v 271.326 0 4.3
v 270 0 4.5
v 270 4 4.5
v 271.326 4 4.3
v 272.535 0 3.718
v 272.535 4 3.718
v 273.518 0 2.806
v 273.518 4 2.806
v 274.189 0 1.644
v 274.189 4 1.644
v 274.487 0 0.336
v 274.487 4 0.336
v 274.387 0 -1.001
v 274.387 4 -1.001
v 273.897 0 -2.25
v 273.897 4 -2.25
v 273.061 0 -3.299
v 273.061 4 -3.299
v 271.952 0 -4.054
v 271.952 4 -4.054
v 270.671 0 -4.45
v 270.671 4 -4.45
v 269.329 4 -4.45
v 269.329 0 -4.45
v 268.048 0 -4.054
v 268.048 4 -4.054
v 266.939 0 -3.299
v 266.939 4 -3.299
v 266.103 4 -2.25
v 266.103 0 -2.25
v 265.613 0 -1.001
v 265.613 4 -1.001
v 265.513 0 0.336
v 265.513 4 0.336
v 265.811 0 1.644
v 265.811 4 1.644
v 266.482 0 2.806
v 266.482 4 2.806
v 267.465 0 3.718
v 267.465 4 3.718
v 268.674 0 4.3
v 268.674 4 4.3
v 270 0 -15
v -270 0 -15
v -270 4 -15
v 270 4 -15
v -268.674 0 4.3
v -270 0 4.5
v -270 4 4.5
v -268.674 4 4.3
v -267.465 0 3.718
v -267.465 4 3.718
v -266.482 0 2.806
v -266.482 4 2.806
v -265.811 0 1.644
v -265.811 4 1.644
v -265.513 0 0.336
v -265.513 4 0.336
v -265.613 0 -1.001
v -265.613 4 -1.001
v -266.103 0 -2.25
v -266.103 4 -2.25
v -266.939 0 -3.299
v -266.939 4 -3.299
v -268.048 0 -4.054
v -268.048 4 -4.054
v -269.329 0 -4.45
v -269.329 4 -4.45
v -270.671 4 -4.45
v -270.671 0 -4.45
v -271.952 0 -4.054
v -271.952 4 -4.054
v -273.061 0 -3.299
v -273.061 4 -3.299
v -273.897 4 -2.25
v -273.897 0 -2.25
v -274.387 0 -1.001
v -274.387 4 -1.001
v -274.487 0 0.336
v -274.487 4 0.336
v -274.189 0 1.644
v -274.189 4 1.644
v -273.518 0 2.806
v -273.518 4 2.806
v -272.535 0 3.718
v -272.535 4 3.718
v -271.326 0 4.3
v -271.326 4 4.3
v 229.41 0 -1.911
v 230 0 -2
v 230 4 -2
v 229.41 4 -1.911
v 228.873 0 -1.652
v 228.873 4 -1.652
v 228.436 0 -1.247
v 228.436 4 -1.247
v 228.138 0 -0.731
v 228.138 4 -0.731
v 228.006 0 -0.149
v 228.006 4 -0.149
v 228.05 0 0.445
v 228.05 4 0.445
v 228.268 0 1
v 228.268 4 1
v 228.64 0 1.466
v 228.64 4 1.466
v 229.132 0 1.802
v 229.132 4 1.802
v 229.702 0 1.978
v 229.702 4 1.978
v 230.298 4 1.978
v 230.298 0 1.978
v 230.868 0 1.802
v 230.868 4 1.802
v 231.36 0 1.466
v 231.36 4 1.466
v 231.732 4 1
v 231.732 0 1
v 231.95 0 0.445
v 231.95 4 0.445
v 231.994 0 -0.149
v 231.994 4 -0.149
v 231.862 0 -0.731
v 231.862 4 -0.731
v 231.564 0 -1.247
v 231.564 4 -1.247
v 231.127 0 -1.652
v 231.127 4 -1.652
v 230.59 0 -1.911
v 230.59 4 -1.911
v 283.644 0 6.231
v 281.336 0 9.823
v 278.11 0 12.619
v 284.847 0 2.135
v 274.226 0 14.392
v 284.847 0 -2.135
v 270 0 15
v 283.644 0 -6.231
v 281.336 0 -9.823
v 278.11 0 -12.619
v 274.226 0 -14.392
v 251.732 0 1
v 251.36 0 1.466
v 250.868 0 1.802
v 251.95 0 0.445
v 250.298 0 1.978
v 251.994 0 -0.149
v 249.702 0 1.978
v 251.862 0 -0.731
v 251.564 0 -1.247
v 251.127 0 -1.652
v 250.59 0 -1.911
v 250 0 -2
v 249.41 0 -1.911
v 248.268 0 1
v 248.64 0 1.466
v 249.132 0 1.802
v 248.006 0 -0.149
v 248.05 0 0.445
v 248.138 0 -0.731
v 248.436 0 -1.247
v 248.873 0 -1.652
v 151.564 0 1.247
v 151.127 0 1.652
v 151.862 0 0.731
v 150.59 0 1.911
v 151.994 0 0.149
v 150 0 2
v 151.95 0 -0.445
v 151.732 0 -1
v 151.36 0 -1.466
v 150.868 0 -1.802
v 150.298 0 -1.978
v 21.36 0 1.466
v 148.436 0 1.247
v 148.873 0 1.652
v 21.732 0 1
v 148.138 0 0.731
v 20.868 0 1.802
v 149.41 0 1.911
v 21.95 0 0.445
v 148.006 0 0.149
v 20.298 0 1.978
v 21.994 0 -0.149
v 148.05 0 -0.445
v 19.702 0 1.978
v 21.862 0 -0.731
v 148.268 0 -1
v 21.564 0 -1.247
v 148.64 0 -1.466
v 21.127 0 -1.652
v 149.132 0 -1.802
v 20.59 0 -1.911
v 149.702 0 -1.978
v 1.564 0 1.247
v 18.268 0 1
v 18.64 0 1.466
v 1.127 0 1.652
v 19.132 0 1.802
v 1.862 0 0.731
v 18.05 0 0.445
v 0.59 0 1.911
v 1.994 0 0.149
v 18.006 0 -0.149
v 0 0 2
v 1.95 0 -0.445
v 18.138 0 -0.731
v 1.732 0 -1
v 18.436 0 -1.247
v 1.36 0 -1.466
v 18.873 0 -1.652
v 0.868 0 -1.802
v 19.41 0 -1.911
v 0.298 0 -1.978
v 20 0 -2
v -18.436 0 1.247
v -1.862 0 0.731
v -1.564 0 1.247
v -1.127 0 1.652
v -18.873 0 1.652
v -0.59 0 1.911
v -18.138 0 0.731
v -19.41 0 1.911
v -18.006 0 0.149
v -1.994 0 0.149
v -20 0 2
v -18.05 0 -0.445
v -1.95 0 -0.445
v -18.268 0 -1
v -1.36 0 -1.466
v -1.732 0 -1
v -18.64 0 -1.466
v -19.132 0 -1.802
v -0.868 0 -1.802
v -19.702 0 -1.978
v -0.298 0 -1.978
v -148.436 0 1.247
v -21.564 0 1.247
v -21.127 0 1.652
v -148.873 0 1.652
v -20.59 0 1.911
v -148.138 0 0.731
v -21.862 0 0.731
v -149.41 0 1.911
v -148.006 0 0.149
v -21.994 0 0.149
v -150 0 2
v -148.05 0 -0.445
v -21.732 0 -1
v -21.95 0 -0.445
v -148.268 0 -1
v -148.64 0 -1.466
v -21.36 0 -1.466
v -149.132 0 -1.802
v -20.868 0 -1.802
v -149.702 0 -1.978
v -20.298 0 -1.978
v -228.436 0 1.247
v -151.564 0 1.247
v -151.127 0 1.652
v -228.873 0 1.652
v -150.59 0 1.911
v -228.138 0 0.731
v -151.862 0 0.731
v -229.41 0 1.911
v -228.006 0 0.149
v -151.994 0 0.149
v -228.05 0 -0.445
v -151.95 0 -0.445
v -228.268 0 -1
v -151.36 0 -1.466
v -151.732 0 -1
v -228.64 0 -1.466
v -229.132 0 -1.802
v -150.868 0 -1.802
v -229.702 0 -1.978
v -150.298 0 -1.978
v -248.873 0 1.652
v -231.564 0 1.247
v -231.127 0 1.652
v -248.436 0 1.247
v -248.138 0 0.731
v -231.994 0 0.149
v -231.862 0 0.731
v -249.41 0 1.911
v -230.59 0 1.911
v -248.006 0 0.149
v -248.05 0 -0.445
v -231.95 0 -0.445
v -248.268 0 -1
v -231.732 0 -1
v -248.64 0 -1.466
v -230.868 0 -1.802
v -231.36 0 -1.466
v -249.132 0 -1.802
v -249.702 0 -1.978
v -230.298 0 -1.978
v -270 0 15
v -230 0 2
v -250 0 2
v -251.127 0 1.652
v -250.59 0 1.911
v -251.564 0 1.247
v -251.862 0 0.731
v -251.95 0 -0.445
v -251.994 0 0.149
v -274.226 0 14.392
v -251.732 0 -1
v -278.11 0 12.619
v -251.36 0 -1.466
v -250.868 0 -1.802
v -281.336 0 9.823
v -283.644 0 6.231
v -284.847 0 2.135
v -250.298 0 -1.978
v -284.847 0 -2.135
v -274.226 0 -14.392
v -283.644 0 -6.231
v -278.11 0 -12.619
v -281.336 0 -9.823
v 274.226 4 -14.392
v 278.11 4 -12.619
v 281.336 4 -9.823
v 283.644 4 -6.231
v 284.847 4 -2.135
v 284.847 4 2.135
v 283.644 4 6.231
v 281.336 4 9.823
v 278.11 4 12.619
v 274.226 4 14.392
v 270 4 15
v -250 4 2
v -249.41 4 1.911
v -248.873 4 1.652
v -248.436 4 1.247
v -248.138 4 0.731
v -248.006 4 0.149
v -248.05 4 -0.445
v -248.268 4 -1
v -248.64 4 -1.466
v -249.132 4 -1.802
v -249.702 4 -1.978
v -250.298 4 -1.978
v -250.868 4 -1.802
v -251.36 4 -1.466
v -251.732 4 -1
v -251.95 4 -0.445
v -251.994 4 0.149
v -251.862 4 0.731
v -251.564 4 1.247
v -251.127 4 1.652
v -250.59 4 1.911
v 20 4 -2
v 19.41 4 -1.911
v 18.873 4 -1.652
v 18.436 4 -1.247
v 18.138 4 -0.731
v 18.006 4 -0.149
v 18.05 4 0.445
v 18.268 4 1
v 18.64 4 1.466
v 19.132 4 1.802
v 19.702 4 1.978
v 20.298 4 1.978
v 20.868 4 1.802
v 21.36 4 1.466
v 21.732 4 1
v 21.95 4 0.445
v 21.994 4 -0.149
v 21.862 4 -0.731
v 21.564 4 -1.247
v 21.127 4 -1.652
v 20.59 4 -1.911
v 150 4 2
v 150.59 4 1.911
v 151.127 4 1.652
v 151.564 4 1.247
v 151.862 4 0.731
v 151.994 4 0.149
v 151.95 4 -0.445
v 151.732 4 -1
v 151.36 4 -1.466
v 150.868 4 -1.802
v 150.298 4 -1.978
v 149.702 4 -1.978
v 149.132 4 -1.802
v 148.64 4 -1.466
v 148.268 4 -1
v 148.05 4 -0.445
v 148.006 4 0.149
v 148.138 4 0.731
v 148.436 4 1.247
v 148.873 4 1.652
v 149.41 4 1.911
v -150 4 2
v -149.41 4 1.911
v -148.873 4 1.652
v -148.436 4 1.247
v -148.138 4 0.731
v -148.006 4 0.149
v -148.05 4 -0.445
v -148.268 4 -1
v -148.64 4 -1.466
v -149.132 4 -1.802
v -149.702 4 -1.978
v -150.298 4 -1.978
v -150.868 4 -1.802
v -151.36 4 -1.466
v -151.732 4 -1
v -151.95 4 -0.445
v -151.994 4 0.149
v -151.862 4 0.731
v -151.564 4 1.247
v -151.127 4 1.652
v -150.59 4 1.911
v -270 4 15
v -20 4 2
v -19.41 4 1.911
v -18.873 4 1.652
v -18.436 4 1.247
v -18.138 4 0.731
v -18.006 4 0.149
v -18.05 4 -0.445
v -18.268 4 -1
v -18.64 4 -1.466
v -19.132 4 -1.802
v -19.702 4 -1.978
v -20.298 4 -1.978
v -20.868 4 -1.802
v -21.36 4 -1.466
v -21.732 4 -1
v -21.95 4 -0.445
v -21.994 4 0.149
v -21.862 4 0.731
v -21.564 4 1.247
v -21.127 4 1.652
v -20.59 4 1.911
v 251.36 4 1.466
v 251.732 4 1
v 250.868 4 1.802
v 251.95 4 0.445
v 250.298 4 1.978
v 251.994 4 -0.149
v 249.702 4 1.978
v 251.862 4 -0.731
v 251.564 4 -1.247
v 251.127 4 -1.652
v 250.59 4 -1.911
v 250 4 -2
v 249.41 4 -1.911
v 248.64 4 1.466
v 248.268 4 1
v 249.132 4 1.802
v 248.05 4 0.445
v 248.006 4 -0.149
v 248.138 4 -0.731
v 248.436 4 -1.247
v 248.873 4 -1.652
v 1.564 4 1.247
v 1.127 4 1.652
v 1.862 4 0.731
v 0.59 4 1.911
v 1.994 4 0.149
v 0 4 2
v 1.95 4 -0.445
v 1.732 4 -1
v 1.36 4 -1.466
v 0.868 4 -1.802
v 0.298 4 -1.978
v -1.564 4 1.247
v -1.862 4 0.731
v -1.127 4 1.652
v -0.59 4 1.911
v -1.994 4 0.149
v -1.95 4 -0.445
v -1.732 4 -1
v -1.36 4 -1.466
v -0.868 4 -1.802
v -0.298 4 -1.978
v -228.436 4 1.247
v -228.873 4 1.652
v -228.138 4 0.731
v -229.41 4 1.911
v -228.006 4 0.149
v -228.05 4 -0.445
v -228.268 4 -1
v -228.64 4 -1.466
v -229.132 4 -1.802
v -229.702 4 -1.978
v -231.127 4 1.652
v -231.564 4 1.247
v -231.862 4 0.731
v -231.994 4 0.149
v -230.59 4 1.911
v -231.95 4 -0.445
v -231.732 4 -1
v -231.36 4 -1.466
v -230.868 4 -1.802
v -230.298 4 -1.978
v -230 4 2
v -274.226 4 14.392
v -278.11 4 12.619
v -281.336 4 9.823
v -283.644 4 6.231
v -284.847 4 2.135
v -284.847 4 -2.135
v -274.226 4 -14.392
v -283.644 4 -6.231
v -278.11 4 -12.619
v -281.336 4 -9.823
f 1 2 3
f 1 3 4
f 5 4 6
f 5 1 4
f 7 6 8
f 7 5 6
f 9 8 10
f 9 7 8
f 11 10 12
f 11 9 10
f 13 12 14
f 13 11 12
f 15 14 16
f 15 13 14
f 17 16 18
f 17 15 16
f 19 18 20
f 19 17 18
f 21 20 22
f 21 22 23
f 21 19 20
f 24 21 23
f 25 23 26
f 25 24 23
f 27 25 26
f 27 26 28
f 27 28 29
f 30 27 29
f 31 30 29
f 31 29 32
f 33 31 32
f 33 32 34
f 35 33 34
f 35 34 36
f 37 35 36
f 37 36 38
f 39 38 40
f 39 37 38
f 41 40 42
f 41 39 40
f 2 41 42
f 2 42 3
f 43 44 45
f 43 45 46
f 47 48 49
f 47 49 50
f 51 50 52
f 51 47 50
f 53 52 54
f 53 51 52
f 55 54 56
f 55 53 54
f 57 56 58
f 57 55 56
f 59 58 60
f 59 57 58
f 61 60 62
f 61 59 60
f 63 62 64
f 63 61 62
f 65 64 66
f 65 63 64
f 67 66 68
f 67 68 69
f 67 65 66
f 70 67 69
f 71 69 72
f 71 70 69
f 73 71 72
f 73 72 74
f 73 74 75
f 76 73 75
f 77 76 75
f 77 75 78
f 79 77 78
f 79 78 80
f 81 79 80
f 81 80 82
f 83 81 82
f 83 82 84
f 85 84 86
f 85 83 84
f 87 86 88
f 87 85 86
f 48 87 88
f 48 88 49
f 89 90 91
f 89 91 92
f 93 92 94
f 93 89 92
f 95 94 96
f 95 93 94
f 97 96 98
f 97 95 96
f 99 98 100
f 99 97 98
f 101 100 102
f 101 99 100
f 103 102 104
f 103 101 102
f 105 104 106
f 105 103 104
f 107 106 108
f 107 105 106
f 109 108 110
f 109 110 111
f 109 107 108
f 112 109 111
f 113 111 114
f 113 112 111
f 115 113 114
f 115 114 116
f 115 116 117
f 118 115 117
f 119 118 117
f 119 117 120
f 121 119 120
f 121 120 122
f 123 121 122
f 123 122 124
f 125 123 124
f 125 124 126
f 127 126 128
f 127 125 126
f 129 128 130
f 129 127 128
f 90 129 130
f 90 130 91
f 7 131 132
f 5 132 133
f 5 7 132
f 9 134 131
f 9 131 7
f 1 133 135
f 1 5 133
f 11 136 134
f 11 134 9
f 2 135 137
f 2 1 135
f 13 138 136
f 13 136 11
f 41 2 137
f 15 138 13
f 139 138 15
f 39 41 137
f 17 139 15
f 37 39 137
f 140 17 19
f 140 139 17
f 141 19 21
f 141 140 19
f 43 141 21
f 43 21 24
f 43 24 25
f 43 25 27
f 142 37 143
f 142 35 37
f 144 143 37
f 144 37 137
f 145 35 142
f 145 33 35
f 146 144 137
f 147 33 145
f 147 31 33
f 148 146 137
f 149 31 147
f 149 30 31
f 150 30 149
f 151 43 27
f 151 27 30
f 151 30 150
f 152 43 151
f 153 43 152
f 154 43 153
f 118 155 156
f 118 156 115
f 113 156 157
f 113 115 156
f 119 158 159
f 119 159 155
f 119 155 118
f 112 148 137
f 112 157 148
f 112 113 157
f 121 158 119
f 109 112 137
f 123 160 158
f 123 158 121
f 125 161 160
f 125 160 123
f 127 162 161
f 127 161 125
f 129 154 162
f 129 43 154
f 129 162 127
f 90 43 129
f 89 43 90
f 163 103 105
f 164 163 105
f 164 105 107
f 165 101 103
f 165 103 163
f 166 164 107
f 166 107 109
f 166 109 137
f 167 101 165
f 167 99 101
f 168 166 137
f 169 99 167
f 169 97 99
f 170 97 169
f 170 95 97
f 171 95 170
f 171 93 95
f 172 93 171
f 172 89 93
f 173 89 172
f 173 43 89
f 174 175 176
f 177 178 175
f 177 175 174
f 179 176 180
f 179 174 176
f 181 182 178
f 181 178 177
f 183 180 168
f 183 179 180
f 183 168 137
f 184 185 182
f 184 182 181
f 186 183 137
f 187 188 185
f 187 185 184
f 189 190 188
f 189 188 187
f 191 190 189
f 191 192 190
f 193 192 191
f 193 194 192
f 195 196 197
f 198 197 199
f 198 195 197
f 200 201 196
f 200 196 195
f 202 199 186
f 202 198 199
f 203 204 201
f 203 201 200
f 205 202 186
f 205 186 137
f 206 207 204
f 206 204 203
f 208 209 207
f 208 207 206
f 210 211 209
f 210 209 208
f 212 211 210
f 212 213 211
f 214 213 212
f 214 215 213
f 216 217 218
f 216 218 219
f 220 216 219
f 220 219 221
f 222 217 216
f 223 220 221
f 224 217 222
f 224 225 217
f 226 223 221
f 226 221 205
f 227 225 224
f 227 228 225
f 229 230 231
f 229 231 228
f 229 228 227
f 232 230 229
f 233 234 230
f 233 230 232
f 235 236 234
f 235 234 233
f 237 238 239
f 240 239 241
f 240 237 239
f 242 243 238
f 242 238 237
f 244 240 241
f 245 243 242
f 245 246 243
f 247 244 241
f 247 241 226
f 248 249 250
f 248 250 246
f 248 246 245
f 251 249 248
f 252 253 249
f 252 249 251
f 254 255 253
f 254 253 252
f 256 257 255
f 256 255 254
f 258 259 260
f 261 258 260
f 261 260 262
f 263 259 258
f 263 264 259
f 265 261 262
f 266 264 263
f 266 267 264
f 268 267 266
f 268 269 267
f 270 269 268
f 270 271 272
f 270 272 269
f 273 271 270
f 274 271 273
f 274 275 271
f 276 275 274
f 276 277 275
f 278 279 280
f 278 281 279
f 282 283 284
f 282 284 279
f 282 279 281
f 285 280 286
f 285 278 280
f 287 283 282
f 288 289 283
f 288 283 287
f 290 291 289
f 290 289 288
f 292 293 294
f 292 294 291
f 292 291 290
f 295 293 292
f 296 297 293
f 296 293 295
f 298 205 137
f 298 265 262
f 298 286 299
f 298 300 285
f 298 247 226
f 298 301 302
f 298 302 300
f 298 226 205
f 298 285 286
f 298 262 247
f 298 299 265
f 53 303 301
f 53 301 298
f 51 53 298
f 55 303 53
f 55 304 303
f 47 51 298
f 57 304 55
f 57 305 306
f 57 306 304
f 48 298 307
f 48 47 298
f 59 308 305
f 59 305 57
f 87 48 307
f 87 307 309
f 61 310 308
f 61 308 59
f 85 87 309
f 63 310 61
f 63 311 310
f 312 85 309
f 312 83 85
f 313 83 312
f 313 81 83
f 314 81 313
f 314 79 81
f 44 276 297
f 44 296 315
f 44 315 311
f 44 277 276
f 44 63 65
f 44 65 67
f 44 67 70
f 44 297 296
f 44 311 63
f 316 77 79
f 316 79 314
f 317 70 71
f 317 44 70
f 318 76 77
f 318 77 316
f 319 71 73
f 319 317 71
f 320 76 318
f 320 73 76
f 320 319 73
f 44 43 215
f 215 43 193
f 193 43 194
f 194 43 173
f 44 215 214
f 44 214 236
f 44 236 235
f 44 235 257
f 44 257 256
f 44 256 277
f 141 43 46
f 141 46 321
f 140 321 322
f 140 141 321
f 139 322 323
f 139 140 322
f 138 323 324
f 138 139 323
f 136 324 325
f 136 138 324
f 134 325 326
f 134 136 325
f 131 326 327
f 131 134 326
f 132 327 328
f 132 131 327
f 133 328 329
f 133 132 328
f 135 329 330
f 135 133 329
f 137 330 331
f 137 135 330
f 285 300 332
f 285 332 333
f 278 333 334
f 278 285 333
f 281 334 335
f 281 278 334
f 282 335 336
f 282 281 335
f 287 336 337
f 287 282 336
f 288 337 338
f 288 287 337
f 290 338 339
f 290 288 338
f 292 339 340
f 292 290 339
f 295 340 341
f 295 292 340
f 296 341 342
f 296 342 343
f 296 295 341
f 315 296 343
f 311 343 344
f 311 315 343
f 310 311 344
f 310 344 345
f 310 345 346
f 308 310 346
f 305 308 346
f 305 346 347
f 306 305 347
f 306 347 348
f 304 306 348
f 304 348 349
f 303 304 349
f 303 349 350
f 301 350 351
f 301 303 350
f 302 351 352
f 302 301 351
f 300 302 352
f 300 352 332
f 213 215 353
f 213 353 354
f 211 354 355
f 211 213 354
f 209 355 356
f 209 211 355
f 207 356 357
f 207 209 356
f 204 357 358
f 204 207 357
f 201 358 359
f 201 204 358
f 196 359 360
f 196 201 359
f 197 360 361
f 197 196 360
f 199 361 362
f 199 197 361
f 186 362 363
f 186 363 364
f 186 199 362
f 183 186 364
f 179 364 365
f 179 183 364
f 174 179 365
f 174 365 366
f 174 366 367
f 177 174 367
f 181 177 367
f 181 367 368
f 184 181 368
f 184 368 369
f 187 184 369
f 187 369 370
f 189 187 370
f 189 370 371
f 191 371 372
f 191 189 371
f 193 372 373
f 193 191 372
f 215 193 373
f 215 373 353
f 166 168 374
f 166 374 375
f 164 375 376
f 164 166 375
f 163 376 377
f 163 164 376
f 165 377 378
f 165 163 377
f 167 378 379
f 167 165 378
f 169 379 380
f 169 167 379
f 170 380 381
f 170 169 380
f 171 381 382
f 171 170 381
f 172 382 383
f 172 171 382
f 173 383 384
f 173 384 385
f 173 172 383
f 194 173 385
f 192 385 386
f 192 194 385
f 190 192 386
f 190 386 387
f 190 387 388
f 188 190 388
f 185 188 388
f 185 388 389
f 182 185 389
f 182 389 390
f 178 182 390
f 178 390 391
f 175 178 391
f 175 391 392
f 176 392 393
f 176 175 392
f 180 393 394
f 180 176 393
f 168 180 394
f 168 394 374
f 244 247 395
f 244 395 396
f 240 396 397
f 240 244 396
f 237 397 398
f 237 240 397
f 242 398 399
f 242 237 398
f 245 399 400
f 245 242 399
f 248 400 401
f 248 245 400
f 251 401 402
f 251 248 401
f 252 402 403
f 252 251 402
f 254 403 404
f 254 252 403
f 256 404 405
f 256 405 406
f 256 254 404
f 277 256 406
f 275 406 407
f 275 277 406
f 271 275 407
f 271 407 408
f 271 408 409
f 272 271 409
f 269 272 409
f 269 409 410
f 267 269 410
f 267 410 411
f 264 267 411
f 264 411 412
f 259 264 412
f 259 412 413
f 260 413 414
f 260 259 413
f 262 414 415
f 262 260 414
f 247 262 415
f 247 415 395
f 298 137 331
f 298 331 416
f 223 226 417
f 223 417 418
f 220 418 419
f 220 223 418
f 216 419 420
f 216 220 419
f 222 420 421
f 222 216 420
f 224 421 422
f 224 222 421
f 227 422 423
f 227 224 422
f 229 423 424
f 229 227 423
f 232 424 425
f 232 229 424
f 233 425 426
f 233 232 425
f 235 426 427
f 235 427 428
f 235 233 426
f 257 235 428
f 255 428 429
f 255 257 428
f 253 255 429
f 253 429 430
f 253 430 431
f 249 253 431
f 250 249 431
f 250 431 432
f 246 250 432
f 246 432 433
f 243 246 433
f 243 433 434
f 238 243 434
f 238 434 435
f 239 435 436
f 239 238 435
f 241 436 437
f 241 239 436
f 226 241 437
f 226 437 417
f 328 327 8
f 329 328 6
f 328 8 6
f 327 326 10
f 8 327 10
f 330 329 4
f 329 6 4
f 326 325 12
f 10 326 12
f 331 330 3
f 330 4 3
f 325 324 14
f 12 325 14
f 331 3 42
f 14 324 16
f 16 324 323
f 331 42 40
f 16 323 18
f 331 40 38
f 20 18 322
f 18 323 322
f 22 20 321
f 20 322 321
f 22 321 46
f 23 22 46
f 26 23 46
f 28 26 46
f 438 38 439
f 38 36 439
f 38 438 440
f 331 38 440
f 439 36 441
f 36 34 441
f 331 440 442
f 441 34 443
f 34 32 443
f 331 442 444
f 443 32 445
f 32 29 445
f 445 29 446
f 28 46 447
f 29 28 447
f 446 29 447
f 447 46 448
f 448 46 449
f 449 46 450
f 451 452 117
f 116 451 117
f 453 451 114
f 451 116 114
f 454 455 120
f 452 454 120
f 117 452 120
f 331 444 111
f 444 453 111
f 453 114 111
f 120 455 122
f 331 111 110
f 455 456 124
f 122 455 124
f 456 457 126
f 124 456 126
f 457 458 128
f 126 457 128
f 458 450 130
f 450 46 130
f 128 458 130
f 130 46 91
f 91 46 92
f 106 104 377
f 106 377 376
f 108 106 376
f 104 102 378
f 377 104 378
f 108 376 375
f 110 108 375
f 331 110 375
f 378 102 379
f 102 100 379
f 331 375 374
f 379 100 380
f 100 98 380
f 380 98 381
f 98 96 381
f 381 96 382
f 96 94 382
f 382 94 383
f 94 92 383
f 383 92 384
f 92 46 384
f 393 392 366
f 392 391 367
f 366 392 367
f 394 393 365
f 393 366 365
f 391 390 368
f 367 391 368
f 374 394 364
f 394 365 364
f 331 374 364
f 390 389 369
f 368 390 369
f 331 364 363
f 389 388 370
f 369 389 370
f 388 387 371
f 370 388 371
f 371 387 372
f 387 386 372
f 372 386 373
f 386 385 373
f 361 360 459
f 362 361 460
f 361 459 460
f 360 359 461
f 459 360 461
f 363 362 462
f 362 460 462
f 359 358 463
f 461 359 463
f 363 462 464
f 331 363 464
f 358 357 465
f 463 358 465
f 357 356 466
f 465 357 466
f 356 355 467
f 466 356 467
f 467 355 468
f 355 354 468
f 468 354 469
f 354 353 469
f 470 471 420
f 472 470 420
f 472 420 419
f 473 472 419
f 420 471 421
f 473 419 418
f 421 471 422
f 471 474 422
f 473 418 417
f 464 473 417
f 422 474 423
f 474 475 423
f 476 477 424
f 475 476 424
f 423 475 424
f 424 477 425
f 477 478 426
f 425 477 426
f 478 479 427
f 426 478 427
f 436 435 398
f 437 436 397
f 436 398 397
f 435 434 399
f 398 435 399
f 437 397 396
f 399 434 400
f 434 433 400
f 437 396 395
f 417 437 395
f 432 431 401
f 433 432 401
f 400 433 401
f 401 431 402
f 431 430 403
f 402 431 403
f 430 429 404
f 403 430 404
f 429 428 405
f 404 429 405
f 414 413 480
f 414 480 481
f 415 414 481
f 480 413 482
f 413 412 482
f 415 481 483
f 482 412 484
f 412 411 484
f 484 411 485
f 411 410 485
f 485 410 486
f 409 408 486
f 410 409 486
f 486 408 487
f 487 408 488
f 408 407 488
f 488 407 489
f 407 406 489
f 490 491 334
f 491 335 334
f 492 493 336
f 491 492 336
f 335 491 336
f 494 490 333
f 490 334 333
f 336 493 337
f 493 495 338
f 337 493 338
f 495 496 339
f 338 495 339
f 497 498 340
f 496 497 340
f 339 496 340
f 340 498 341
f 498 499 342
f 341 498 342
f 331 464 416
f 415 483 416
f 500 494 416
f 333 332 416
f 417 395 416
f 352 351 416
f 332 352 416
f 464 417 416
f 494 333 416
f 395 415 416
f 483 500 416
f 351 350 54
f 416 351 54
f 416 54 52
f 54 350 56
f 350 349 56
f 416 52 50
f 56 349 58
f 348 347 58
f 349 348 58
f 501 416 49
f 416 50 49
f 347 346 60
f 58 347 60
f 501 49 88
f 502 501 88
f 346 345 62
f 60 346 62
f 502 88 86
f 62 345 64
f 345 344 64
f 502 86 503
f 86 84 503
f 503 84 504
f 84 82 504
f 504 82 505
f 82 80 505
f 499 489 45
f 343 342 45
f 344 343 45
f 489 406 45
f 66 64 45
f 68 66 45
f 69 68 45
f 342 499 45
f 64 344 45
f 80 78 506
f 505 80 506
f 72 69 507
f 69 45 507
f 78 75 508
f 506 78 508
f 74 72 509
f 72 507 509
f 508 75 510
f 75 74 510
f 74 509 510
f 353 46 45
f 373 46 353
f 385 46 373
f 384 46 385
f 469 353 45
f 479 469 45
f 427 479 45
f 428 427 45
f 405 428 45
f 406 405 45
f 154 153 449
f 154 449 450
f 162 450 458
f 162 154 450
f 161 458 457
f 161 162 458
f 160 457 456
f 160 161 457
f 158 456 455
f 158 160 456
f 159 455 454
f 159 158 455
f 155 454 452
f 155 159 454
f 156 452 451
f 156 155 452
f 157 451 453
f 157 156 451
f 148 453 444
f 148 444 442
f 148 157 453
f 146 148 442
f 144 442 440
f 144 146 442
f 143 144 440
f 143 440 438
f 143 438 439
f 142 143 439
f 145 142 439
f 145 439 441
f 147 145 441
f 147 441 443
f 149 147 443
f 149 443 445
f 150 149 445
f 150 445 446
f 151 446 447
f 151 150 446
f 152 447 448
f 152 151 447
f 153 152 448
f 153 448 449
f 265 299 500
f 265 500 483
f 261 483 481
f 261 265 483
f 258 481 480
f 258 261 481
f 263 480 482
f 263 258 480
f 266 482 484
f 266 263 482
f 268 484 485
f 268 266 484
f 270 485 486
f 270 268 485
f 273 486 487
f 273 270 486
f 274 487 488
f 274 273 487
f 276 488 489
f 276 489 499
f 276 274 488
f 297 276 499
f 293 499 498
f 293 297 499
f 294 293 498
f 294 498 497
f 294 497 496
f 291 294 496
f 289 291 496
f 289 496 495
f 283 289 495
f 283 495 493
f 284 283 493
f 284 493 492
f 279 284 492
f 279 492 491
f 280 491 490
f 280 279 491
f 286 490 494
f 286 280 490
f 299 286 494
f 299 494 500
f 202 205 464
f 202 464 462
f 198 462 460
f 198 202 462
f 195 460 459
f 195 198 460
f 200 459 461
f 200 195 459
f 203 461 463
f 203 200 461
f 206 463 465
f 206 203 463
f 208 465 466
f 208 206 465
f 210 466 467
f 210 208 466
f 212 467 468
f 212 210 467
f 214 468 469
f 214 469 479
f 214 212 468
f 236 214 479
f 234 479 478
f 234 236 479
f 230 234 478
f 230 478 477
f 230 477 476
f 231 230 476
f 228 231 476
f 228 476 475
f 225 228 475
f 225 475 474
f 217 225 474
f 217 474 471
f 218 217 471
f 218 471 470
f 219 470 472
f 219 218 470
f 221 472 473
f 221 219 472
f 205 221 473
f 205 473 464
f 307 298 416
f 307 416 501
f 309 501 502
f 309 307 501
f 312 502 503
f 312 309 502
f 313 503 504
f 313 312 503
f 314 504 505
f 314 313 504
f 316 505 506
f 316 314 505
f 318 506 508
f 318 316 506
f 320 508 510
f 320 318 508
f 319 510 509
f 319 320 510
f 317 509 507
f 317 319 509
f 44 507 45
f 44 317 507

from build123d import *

# Parameters (mm, degrees)
SKETCH1_R           = 4.5
SKETCH1_R_2         = 2
BOSS_EXTRUDE1_DEPTH = 4


with BuildPart() as part:
    # Sketch1 → Boss-Extrude1 (new body)
    with BuildSketch(Plane(origin=(0, 0, 0), x_dir=(1, 0, 0), z_dir=(0, 1, 0))):
        with BuildLine():
            Line((-270, 15), (270, 15))
            ThreePointArc((270, 15), (285, 0), (270, -15))
            Line((270, -15), (-270, -15))
            ThreePointArc((-270, -15), (-285, 0), (-270, 15))
        make_face()
        with Locations(Location((-270, 0, 0), (0, 0, 270))):
            Circle(SKETCH1_R, mode=Mode.SUBTRACT)
        with Locations(Location((270, 0, 0), (0, 0, 270))):
            Circle(SKETCH1_R, mode=Mode.SUBTRACT)
        with Locations(Location((-150, 0, 0), (0, 0, 270))):
            Circle(SKETCH1_R_2, mode=Mode.SUBTRACT)
        with Locations(Location((150, 0, 0), (0, 0, 270))):
            Circle(SKETCH1_R_2, mode=Mode.SUBTRACT)
        with Locations(Location((0, 0, 0), (0, 0, 270))):
            Circle(SKETCH1_R_2, mode=Mode.SUBTRACT)
        with Locations(Location((-250, 0, 0), (0, 0, 270))):
            Circle(SKETCH1_R_2, mode=Mode.SUBTRACT)
        with Locations(Location((-230, 0, 0), (0, 0, 270))):
            Circle(SKETCH1_R_2, mode=Mode.SUBTRACT)
        with Locations(Location((-20, 0, 0), (0, 0, 270))):
            Circle(SKETCH1_R_2, mode=Mode.SUBTRACT)
        with Locations(Location((230, 0, 0), (0, 0, 90))):
            Circle(SKETCH1_R_2, mode=Mode.SUBTRACT)
        with Locations(Location((250, 0, 0), (0, 0, 90))):
            Circle(SKETCH1_R_2, mode=Mode.SUBTRACT)
        with Locations(Location((20, 0, 0), (0, 0, 90))):
            Circle(SKETCH1_R_2, mode=Mode.SUBTRACT)
    extrude(amount=BOSS_EXTRUDE1_DEPTH)


solid = part.part
